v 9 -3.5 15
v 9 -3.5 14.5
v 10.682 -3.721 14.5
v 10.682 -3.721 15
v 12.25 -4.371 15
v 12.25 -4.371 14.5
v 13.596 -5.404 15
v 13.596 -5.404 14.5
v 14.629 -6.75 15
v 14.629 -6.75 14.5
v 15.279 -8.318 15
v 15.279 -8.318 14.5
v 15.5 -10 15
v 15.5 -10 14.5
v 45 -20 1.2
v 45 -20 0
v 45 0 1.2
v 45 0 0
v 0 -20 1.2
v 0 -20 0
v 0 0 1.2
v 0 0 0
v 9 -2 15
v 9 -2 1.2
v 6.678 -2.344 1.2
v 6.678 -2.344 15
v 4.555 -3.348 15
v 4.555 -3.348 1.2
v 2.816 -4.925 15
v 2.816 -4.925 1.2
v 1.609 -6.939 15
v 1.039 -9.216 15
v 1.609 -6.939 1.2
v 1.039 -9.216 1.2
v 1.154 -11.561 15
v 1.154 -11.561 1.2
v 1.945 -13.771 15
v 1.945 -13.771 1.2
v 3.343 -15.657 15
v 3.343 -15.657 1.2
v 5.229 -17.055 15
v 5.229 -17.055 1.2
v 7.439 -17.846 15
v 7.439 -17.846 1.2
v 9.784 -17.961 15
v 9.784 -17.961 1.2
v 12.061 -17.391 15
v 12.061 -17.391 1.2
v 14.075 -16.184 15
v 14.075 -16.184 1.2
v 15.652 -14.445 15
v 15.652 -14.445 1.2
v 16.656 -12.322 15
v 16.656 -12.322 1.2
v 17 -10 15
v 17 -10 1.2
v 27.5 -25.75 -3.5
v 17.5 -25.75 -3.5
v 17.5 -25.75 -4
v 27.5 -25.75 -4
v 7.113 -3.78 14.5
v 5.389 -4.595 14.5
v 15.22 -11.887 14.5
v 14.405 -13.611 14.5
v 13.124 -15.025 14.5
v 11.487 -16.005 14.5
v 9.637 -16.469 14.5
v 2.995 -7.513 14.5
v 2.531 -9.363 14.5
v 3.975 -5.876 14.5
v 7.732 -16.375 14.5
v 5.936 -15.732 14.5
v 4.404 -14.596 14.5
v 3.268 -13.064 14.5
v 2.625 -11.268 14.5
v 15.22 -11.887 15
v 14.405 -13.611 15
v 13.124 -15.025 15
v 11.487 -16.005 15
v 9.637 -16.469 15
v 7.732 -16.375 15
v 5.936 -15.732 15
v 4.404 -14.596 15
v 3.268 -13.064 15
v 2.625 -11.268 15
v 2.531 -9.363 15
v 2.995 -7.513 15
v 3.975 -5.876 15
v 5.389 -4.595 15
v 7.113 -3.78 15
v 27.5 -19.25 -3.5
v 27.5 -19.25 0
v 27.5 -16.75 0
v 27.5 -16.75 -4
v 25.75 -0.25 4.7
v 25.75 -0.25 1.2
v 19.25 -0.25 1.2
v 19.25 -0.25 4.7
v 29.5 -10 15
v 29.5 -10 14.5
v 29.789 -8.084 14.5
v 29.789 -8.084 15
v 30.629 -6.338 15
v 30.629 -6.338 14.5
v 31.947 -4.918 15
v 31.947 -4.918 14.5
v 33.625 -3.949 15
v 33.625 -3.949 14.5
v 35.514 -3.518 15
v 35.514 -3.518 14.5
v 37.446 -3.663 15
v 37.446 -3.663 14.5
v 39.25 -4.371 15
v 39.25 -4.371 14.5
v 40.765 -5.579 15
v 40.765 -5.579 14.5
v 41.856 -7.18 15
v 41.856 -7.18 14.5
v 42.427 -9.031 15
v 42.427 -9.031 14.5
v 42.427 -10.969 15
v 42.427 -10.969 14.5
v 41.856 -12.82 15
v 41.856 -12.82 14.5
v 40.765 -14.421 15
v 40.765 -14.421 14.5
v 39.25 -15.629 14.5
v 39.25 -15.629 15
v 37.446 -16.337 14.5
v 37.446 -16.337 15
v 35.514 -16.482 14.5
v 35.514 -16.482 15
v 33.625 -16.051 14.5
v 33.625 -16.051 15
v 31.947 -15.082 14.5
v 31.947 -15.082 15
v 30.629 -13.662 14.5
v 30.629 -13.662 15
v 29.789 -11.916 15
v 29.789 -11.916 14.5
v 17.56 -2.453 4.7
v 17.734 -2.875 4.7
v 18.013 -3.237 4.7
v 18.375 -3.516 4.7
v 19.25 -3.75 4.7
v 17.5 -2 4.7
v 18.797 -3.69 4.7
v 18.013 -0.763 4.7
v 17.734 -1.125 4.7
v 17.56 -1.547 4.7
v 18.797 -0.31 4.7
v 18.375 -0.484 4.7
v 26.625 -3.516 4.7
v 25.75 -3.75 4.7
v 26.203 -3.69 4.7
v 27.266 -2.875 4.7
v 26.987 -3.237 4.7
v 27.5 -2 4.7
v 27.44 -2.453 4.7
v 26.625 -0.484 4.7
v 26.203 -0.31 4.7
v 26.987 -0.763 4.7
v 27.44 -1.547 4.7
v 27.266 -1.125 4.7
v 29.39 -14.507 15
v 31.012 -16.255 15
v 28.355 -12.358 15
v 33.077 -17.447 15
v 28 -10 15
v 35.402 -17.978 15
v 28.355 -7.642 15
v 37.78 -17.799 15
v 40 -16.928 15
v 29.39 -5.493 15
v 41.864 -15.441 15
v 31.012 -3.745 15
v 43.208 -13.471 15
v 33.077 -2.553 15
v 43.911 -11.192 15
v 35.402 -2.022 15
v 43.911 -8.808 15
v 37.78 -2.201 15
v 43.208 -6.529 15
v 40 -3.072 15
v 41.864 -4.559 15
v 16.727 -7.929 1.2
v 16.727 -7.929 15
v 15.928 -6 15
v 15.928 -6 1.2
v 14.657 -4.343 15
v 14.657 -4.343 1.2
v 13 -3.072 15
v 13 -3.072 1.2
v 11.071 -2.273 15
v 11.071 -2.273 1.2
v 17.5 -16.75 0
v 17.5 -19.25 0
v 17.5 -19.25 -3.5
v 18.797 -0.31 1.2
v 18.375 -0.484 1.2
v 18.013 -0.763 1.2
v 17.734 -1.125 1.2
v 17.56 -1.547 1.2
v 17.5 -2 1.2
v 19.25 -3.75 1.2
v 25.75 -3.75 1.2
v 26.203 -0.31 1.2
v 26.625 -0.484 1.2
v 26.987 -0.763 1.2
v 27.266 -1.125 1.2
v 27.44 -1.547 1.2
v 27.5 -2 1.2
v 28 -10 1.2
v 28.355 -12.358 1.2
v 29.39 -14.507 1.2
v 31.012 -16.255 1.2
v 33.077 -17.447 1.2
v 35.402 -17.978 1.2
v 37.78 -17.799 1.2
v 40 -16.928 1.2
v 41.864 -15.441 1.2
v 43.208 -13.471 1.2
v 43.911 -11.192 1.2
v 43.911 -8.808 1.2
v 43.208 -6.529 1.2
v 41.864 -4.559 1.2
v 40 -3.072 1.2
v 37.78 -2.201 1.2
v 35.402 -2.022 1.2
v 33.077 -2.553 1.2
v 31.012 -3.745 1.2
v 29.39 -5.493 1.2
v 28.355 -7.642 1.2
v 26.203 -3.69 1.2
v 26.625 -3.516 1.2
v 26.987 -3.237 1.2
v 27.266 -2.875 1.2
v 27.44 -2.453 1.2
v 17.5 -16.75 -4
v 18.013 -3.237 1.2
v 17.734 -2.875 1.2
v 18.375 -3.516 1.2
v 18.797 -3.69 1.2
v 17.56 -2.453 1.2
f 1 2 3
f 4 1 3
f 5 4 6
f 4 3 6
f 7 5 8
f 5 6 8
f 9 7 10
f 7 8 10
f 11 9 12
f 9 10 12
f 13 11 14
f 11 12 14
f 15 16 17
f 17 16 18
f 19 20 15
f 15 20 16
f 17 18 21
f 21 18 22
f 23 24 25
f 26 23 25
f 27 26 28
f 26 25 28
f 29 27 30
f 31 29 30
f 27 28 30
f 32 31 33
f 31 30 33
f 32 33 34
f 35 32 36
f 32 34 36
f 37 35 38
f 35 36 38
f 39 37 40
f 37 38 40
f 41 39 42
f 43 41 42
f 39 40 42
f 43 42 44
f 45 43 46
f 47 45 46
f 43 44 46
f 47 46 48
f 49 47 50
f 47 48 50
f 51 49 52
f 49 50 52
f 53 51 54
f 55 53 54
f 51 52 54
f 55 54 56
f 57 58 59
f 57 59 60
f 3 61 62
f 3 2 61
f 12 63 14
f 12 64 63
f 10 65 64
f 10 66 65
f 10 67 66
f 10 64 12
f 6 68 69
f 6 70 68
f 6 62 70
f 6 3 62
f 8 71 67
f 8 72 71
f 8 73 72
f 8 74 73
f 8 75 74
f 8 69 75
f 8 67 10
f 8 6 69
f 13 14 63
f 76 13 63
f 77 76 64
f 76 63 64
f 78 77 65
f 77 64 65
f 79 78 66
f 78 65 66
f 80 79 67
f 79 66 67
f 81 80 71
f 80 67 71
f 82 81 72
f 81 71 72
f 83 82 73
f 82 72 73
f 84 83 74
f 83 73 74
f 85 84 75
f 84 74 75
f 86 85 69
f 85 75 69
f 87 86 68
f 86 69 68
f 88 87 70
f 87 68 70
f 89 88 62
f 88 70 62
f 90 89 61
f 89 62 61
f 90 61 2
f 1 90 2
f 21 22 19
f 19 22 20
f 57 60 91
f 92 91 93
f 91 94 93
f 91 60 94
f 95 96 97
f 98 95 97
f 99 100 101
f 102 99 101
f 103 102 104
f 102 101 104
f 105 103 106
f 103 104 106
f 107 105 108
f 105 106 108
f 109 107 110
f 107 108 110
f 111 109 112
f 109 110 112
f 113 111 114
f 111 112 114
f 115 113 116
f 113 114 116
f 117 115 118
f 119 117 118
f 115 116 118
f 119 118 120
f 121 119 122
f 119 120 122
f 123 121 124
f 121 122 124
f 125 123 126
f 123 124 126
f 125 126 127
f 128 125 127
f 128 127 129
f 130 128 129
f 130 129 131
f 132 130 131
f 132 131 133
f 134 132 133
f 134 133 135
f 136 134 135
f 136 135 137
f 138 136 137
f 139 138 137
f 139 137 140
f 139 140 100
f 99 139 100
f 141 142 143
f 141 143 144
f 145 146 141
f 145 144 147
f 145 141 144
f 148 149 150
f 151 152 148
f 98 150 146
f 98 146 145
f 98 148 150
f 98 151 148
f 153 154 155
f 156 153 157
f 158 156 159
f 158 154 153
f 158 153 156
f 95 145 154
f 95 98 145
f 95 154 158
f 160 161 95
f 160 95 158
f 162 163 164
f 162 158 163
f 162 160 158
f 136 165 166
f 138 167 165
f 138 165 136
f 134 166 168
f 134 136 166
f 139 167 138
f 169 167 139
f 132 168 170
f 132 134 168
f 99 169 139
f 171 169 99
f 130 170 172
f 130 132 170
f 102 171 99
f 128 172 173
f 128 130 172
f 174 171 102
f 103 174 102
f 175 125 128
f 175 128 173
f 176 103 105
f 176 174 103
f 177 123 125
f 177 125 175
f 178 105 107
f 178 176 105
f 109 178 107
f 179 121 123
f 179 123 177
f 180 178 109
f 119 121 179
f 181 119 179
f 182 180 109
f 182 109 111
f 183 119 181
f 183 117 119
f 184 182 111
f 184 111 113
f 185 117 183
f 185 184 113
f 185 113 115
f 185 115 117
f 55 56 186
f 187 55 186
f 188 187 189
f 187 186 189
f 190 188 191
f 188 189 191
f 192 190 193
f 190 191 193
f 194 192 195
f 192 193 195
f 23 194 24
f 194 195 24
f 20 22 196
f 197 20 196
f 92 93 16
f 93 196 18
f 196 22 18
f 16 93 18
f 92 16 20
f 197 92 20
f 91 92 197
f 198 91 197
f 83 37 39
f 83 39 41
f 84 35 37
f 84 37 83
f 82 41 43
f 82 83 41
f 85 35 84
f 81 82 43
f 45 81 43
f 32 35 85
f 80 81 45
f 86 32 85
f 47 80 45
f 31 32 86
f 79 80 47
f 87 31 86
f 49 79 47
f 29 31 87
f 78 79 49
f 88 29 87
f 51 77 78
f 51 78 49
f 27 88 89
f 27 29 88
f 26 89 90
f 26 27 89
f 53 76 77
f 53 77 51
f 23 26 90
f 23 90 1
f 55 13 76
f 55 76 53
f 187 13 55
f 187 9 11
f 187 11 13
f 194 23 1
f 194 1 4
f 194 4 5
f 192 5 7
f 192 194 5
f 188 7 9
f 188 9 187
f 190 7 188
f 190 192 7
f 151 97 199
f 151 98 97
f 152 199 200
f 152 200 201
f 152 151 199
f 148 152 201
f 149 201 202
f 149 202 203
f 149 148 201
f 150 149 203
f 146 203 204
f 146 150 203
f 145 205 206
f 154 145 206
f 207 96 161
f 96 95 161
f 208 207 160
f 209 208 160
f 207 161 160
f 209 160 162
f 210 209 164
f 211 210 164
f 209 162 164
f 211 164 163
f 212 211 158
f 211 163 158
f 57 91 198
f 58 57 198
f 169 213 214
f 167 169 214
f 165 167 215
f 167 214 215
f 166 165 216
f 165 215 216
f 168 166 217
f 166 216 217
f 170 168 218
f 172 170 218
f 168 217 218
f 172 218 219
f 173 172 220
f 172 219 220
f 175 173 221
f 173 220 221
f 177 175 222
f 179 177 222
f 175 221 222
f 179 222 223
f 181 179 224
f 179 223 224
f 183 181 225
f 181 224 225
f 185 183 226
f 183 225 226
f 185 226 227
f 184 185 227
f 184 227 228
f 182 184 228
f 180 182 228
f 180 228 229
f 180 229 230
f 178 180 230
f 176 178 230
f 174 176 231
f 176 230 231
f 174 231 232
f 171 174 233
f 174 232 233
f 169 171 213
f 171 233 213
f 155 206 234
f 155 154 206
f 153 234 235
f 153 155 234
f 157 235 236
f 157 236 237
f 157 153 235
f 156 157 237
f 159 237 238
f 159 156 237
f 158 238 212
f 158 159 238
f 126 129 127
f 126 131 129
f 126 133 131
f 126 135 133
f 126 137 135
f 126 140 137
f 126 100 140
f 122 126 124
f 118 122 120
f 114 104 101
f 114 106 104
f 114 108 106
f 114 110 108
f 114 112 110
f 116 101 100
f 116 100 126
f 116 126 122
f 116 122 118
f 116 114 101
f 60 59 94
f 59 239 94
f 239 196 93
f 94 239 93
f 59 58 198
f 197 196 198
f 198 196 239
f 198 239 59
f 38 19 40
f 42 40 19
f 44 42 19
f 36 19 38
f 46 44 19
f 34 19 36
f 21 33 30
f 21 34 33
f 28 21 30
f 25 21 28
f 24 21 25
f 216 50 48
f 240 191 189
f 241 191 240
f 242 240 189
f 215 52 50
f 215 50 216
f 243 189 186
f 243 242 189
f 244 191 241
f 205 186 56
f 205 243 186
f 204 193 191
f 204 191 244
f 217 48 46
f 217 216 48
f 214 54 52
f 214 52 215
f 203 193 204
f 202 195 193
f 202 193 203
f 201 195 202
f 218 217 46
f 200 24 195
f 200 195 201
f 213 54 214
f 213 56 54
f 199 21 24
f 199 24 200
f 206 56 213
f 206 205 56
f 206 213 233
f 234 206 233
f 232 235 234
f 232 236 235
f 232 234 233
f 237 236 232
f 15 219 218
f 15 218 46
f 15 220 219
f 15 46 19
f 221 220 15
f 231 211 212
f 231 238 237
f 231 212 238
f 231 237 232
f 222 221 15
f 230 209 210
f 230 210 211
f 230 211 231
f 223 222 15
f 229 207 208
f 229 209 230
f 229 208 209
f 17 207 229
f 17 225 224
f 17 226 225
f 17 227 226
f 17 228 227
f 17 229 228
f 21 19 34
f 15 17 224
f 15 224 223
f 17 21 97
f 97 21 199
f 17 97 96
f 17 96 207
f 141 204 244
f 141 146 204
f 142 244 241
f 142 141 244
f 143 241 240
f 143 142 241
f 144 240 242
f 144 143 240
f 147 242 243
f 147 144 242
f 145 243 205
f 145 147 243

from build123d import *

# Parameters (mm, degrees)
F1_DEPTH = 1.2
F3_DEPTH = 4
F5_DEPTH = 6.5
F7_DEPTH = 13.8
F8_DEPTH = 13.3
F9_DEPTH = 3.5
F10_R    = 1.74999


# Not quite as in the source:
# - a fillet or chamfer is up to 0.001 mm smaller than in the source, because OpenCascade refuses the exact size


with BuildPart() as f1:
    # F0 (on Top) → F1 (new body)
    with BuildSketch(Plane.XY):
        Polygon((9, 0), (0, 0), (0, -20), (45, -20), (45, 0), (36, 0), (22.5, 0), align=None)
    extrude(amount=F1_DEPTH)

    # F2 (on face) → F3 (join)
    with BuildSketch(Plane(origin=(0, 0, 0), x_dir=(1, 0, 0), z_dir=(0, 0, -1))):
        Polygon((22.5, 16.75), (27.5, 16.75), (27.5, 19.25), (17.5, 19.25), (17.5, 16.75), align=None)
    extrude(amount=F3_DEPTH)

    # F4 (on face) → F5 (join)
    with BuildSketch(Plane.XZ.offset(19.25)):
        Polygon((22.5, -3.5), (17.5, -3.5), (17.5, -4), (27.5, -4), (27.5, -3.5), align=None)
    extrude(amount=F5_DEPTH)

    # F6 (on face) → F7 (join)
    with BuildSketch(Plane.XY.offset(1.2)):
        with BuildLine():
            ThreePointArc((44, -10), (36, -2), (28, -10))
            ThreePointArc((28, -10), (36, -18), (44, -10))
        make_face()
        with BuildLine():
            ThreePointArc((42.5, -10), (36, -16.5), (29.5, -10))
            ThreePointArc((29.5, -10), (36, -3.5), (42.5, -10))
        make_face(mode=Mode.SUBTRACT)
        with BuildLine():
            ThreePointArc((17, -10), (14.6568542495, -4.3431457505), (9, -2))
            Line((9, -2), (9, -3.5))
            ThreePointArc((9, -3.5), (13.5961940777, -5.4038059223), (15.5, -10))
            Line((15.5, -10), (17, -10))
        make_face()
        with BuildLine():
            Line((9, -3.5), (9, -2))
            ThreePointArc((9, -2), (3.3431457505, -15.6568542495), (17, -10))
            Line((17, -10), (15.5, -10))
            ThreePointArc((15.5, -10), (4.4038059223, -14.5961940777), (9, -3.5))
        make_face()
    extrude(amount=F7_DEPTH)

    # F8 (add): faces of the model
    f8_faces = [f1.faces().sort_by_distance(p)[0] for p in [
        (9, -10, 1.2),
        (36, -10, 1.2),
    ]]
    extrude(f8_faces, amount=F8_DEPTH)

    # F6 (on face) → F9 (join)
    with BuildSketch(Plane.XY.offset(1.2)):
        Polygon((27.5, -0.25), (22.5, -0.25), (17.5, -0.25), (17.5, -3.75), (27.5, -3.75), align=None)
    extrude(amount=F9_DEPTH)

    # F10 (radius 1.75 in the source; OpenCascade refuses exactly that, so slightly less here)
    f10_edges = [f1.edges().sort_by_distance(p)[0] for p in [
        (27.5, -0.25, 2.95),
        (27.5, -3.75, 2.95),
        (17.5, -0.25, 2.95),
        (17.5, -3.75, 2.95),
    ]]
    fillet(f10_edges, radius=F10_R)


solid = f1.part
